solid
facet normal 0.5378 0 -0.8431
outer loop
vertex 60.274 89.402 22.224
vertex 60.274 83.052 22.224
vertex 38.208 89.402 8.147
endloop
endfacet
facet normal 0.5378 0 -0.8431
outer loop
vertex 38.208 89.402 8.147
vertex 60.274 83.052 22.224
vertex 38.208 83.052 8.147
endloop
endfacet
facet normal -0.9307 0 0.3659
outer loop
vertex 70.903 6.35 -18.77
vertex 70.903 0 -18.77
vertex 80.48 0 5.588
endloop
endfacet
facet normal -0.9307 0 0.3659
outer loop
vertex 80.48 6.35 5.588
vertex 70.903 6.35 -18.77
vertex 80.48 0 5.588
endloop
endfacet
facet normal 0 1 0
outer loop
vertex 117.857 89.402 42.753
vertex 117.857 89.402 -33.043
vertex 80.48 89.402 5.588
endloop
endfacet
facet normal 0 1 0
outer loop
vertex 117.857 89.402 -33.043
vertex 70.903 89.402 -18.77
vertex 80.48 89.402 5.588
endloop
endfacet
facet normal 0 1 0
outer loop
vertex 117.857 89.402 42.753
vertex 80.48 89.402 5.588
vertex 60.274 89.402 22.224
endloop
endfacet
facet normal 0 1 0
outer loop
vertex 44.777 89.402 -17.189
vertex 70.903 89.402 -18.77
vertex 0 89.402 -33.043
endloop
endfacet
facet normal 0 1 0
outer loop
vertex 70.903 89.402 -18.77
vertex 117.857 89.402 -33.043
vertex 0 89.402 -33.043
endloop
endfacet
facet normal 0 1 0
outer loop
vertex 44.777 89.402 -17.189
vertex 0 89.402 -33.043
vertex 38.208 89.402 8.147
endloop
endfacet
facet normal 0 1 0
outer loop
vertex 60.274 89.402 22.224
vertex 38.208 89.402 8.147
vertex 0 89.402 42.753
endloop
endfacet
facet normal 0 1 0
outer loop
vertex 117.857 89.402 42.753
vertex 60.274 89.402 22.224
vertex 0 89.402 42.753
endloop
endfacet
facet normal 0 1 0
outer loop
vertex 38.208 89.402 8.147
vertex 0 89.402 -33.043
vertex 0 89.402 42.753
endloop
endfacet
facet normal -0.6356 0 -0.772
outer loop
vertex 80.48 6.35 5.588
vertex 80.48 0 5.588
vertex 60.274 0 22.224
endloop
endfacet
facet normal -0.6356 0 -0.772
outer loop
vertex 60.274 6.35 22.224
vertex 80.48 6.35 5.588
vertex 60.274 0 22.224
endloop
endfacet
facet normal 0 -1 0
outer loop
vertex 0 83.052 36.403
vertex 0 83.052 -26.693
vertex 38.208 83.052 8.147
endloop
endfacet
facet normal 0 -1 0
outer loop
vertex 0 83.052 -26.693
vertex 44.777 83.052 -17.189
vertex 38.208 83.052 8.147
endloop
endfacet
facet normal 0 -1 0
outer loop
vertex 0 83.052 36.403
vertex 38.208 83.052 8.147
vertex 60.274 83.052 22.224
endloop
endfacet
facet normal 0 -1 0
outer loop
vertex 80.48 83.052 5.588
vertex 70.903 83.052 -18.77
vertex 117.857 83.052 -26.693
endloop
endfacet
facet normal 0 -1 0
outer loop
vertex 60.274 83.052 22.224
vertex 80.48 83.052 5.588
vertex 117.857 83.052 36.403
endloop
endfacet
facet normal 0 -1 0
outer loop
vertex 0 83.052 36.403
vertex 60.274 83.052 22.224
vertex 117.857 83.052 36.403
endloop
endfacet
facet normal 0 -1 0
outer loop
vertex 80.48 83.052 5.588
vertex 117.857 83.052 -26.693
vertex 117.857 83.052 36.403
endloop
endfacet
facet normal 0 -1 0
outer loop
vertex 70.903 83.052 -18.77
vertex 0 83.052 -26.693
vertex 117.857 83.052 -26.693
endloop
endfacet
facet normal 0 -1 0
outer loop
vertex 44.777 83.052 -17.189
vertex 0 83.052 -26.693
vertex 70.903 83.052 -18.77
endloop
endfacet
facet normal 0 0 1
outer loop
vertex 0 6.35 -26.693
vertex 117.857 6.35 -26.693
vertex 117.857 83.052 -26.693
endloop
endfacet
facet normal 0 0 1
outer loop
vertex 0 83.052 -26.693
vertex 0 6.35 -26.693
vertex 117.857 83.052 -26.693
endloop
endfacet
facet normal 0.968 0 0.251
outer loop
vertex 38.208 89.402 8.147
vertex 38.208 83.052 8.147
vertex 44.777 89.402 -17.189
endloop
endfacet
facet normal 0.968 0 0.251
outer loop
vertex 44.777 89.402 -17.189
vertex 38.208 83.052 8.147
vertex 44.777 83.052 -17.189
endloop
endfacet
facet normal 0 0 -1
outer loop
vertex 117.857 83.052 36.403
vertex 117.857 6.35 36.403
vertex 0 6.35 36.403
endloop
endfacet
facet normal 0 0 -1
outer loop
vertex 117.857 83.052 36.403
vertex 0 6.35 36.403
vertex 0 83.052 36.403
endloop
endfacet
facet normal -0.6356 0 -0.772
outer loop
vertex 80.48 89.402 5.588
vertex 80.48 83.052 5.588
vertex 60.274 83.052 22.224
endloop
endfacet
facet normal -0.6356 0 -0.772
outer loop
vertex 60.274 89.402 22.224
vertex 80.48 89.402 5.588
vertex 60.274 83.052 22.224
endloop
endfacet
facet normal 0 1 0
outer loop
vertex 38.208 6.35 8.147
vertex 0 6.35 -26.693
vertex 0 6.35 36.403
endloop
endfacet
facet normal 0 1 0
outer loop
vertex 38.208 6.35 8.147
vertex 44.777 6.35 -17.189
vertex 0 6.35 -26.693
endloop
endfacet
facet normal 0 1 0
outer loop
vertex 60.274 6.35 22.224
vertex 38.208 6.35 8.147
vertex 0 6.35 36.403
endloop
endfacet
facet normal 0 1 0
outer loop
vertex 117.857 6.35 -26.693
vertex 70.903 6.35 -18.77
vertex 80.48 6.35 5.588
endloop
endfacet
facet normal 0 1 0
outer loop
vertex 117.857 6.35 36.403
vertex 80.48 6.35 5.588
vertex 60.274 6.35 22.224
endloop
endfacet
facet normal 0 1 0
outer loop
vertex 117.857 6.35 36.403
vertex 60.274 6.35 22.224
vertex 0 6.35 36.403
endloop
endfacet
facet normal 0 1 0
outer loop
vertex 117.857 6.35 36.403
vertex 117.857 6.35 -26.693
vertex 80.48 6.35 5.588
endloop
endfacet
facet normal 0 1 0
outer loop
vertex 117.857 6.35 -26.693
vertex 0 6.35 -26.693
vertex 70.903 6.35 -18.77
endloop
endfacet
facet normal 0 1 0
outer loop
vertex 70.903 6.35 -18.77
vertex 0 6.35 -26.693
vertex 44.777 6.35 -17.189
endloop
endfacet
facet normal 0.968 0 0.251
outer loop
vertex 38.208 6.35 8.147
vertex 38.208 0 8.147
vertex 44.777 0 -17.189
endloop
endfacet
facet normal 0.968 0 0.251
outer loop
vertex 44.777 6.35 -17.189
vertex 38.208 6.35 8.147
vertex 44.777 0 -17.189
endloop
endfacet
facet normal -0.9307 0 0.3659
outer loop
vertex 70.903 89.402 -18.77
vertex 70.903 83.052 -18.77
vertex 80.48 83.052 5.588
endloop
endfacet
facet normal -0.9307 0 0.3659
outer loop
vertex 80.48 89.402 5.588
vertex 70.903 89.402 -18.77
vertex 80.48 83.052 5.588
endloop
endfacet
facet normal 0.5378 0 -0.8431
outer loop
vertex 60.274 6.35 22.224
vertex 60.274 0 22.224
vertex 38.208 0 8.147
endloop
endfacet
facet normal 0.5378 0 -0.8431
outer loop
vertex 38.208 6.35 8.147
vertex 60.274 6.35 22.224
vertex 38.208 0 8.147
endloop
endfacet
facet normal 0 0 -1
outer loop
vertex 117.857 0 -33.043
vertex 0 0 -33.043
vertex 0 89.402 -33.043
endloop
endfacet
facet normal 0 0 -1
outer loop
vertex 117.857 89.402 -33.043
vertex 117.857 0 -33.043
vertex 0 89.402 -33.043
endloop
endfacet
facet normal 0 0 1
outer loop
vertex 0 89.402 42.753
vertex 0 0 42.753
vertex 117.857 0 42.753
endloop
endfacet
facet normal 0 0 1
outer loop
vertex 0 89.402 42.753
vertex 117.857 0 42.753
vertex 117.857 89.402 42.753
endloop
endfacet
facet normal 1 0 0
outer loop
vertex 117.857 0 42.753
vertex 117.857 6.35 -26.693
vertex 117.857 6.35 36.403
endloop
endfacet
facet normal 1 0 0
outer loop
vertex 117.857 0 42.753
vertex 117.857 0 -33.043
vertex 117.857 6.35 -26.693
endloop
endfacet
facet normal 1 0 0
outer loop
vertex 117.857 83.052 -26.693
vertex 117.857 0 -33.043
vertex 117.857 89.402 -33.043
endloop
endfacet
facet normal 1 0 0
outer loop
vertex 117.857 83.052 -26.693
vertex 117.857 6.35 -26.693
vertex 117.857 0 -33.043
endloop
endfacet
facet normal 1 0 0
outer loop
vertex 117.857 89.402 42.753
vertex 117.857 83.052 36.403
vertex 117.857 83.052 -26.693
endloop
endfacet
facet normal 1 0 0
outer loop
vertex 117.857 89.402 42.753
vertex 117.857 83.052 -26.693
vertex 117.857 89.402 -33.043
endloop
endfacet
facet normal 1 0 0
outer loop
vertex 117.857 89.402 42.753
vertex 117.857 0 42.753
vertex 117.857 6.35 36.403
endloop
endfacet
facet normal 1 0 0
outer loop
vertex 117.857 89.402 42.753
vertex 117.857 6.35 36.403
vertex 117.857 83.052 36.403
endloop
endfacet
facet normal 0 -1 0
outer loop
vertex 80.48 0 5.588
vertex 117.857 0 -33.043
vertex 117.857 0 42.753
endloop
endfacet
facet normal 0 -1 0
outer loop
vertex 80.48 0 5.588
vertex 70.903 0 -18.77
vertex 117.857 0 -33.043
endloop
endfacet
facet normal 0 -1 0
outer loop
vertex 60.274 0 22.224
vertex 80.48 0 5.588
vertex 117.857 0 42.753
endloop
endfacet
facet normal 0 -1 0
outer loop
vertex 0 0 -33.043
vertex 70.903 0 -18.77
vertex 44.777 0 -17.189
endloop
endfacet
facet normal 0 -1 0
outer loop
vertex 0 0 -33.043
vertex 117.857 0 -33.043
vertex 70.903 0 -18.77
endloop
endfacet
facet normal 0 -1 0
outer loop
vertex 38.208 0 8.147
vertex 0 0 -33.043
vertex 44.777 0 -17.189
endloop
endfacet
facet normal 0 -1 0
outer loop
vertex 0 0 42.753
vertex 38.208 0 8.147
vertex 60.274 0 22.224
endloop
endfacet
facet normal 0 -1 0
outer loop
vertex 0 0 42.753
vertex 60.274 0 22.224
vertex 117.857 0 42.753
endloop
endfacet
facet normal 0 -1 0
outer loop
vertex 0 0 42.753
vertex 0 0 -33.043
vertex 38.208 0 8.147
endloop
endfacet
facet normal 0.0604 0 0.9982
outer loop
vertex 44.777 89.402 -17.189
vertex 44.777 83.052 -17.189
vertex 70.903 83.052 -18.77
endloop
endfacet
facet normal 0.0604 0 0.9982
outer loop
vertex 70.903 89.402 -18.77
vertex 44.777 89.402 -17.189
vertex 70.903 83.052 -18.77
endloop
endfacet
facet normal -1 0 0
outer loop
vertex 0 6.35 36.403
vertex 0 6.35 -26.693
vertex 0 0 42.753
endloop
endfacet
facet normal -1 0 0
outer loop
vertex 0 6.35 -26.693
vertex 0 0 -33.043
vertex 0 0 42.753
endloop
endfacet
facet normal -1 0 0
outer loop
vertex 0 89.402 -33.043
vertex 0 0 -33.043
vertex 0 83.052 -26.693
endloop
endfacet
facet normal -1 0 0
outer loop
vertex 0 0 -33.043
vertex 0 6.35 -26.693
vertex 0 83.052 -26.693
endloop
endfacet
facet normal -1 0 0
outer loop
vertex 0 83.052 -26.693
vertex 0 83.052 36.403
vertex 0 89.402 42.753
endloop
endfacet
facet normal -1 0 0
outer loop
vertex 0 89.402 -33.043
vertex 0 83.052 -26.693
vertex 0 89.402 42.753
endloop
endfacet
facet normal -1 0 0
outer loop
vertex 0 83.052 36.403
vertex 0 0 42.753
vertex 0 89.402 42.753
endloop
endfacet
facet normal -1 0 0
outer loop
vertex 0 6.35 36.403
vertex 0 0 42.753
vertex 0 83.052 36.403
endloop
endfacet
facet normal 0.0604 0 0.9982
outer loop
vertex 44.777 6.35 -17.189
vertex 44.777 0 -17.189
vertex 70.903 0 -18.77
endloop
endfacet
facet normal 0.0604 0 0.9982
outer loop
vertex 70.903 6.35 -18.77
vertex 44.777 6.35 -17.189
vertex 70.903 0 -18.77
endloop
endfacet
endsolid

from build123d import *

# Parameters (mm, degrees)
F0_W     = 89.4021987915
F0_H     = 75.7953710854
F2_DEPTH = 117.856964469
F3_W     = 76.7021987915
F3_H     = 63.0953710854
F4_DEPTH = 168.5473639518
F6_DEPTH = 108.4326226264


with BuildPart() as f2:
    # F0 (on Right) → F2 (new body)
    with BuildSketch(Plane.YZ):
        with Locations((44.7010993958, 4.8550125211)):
            Rectangle(F0_W, F0_H)
    extrude(amount=F2_DEPTH)

    # F3 (on face) → F4 (cut)
    with BuildSketch(Plane.YZ.offset(117.856964469)):
        with Locations((44.7010993958, 4.8550125211)):
            Rectangle(F3_W, F3_H)
    extrude(amount=-F4_DEPTH, mode=Mode.SUBTRACT)

    # F5 (on face) → F6 (cut)
    with BuildSketch(Plane.XZ):
        Polygon((70.9031159894, -18.7701933731), (80.4803622858, 5.5882447229), (60.2736428727, 22.2239185493), (38.2079571779, 8.1468923038), (44.7773328466, -17.1888622029), align=None)
    extrude(amount=-F6_DEPTH, mode=Mode.SUBTRACT)


solid = f2.part
